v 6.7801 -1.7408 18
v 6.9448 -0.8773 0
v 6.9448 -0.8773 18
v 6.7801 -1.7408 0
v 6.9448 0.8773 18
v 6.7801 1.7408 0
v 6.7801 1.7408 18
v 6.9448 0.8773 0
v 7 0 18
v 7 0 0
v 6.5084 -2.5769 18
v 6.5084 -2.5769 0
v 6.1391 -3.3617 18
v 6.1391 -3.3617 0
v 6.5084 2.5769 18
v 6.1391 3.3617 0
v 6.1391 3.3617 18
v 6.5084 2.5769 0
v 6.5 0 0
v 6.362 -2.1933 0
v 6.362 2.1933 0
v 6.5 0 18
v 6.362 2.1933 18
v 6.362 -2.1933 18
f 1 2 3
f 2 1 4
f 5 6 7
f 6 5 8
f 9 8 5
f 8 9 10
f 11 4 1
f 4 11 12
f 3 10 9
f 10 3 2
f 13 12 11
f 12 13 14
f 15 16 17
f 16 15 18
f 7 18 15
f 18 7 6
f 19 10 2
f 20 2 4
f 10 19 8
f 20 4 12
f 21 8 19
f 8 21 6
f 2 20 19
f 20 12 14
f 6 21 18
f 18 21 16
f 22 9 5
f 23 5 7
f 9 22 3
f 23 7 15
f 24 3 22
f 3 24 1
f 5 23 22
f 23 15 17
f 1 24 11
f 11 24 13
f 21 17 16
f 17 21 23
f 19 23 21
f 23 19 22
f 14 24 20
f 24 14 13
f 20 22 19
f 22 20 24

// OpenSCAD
$fn = 50;


difference() {
	union() {
		cylinder(h = 18, r = 7.0000000000);
		translate(v = [-14.0000000000, 0, 0]) {
			cylinder(h = 18, r = 7.0000000000);
		}
	}
	union() {
		cylinder(h = 18, r = 3.2500000000);
		cylinder(h = 18, r = 1.8000000000);
		cylinder(h = 18, r = 1.8000000000);
		cylinder(h = 18, r = 1.8000000000);
		translate(v = [-18.5000000000, 0, 0]) {
			hull() {
				translate(v = [-3.7500000000, 0.0000000000, 0]) {
					cylinder(h = 18, r = 7.5000000000);
				}
				translate(v = [3.7500000000, 0.0000000000, 0]) {
					cylinder(h = 18, r = 7.5000000000);
				}
				translate(v = [-3.7500000000, -0.0000000000, 0]) {
					cylinder(h = 18, r = 7.5000000000);
				}
				translate(v = [3.7500000000, -0.0000000000, 0]) {
					cylinder(h = 18, r = 7.5000000000);
				}
			}
		}
		translate(v = [-11.0000000000, 0, 0.0000000000]) {
			cylinder(h = 18, r = 17.5000000000);
		}
	}
}
